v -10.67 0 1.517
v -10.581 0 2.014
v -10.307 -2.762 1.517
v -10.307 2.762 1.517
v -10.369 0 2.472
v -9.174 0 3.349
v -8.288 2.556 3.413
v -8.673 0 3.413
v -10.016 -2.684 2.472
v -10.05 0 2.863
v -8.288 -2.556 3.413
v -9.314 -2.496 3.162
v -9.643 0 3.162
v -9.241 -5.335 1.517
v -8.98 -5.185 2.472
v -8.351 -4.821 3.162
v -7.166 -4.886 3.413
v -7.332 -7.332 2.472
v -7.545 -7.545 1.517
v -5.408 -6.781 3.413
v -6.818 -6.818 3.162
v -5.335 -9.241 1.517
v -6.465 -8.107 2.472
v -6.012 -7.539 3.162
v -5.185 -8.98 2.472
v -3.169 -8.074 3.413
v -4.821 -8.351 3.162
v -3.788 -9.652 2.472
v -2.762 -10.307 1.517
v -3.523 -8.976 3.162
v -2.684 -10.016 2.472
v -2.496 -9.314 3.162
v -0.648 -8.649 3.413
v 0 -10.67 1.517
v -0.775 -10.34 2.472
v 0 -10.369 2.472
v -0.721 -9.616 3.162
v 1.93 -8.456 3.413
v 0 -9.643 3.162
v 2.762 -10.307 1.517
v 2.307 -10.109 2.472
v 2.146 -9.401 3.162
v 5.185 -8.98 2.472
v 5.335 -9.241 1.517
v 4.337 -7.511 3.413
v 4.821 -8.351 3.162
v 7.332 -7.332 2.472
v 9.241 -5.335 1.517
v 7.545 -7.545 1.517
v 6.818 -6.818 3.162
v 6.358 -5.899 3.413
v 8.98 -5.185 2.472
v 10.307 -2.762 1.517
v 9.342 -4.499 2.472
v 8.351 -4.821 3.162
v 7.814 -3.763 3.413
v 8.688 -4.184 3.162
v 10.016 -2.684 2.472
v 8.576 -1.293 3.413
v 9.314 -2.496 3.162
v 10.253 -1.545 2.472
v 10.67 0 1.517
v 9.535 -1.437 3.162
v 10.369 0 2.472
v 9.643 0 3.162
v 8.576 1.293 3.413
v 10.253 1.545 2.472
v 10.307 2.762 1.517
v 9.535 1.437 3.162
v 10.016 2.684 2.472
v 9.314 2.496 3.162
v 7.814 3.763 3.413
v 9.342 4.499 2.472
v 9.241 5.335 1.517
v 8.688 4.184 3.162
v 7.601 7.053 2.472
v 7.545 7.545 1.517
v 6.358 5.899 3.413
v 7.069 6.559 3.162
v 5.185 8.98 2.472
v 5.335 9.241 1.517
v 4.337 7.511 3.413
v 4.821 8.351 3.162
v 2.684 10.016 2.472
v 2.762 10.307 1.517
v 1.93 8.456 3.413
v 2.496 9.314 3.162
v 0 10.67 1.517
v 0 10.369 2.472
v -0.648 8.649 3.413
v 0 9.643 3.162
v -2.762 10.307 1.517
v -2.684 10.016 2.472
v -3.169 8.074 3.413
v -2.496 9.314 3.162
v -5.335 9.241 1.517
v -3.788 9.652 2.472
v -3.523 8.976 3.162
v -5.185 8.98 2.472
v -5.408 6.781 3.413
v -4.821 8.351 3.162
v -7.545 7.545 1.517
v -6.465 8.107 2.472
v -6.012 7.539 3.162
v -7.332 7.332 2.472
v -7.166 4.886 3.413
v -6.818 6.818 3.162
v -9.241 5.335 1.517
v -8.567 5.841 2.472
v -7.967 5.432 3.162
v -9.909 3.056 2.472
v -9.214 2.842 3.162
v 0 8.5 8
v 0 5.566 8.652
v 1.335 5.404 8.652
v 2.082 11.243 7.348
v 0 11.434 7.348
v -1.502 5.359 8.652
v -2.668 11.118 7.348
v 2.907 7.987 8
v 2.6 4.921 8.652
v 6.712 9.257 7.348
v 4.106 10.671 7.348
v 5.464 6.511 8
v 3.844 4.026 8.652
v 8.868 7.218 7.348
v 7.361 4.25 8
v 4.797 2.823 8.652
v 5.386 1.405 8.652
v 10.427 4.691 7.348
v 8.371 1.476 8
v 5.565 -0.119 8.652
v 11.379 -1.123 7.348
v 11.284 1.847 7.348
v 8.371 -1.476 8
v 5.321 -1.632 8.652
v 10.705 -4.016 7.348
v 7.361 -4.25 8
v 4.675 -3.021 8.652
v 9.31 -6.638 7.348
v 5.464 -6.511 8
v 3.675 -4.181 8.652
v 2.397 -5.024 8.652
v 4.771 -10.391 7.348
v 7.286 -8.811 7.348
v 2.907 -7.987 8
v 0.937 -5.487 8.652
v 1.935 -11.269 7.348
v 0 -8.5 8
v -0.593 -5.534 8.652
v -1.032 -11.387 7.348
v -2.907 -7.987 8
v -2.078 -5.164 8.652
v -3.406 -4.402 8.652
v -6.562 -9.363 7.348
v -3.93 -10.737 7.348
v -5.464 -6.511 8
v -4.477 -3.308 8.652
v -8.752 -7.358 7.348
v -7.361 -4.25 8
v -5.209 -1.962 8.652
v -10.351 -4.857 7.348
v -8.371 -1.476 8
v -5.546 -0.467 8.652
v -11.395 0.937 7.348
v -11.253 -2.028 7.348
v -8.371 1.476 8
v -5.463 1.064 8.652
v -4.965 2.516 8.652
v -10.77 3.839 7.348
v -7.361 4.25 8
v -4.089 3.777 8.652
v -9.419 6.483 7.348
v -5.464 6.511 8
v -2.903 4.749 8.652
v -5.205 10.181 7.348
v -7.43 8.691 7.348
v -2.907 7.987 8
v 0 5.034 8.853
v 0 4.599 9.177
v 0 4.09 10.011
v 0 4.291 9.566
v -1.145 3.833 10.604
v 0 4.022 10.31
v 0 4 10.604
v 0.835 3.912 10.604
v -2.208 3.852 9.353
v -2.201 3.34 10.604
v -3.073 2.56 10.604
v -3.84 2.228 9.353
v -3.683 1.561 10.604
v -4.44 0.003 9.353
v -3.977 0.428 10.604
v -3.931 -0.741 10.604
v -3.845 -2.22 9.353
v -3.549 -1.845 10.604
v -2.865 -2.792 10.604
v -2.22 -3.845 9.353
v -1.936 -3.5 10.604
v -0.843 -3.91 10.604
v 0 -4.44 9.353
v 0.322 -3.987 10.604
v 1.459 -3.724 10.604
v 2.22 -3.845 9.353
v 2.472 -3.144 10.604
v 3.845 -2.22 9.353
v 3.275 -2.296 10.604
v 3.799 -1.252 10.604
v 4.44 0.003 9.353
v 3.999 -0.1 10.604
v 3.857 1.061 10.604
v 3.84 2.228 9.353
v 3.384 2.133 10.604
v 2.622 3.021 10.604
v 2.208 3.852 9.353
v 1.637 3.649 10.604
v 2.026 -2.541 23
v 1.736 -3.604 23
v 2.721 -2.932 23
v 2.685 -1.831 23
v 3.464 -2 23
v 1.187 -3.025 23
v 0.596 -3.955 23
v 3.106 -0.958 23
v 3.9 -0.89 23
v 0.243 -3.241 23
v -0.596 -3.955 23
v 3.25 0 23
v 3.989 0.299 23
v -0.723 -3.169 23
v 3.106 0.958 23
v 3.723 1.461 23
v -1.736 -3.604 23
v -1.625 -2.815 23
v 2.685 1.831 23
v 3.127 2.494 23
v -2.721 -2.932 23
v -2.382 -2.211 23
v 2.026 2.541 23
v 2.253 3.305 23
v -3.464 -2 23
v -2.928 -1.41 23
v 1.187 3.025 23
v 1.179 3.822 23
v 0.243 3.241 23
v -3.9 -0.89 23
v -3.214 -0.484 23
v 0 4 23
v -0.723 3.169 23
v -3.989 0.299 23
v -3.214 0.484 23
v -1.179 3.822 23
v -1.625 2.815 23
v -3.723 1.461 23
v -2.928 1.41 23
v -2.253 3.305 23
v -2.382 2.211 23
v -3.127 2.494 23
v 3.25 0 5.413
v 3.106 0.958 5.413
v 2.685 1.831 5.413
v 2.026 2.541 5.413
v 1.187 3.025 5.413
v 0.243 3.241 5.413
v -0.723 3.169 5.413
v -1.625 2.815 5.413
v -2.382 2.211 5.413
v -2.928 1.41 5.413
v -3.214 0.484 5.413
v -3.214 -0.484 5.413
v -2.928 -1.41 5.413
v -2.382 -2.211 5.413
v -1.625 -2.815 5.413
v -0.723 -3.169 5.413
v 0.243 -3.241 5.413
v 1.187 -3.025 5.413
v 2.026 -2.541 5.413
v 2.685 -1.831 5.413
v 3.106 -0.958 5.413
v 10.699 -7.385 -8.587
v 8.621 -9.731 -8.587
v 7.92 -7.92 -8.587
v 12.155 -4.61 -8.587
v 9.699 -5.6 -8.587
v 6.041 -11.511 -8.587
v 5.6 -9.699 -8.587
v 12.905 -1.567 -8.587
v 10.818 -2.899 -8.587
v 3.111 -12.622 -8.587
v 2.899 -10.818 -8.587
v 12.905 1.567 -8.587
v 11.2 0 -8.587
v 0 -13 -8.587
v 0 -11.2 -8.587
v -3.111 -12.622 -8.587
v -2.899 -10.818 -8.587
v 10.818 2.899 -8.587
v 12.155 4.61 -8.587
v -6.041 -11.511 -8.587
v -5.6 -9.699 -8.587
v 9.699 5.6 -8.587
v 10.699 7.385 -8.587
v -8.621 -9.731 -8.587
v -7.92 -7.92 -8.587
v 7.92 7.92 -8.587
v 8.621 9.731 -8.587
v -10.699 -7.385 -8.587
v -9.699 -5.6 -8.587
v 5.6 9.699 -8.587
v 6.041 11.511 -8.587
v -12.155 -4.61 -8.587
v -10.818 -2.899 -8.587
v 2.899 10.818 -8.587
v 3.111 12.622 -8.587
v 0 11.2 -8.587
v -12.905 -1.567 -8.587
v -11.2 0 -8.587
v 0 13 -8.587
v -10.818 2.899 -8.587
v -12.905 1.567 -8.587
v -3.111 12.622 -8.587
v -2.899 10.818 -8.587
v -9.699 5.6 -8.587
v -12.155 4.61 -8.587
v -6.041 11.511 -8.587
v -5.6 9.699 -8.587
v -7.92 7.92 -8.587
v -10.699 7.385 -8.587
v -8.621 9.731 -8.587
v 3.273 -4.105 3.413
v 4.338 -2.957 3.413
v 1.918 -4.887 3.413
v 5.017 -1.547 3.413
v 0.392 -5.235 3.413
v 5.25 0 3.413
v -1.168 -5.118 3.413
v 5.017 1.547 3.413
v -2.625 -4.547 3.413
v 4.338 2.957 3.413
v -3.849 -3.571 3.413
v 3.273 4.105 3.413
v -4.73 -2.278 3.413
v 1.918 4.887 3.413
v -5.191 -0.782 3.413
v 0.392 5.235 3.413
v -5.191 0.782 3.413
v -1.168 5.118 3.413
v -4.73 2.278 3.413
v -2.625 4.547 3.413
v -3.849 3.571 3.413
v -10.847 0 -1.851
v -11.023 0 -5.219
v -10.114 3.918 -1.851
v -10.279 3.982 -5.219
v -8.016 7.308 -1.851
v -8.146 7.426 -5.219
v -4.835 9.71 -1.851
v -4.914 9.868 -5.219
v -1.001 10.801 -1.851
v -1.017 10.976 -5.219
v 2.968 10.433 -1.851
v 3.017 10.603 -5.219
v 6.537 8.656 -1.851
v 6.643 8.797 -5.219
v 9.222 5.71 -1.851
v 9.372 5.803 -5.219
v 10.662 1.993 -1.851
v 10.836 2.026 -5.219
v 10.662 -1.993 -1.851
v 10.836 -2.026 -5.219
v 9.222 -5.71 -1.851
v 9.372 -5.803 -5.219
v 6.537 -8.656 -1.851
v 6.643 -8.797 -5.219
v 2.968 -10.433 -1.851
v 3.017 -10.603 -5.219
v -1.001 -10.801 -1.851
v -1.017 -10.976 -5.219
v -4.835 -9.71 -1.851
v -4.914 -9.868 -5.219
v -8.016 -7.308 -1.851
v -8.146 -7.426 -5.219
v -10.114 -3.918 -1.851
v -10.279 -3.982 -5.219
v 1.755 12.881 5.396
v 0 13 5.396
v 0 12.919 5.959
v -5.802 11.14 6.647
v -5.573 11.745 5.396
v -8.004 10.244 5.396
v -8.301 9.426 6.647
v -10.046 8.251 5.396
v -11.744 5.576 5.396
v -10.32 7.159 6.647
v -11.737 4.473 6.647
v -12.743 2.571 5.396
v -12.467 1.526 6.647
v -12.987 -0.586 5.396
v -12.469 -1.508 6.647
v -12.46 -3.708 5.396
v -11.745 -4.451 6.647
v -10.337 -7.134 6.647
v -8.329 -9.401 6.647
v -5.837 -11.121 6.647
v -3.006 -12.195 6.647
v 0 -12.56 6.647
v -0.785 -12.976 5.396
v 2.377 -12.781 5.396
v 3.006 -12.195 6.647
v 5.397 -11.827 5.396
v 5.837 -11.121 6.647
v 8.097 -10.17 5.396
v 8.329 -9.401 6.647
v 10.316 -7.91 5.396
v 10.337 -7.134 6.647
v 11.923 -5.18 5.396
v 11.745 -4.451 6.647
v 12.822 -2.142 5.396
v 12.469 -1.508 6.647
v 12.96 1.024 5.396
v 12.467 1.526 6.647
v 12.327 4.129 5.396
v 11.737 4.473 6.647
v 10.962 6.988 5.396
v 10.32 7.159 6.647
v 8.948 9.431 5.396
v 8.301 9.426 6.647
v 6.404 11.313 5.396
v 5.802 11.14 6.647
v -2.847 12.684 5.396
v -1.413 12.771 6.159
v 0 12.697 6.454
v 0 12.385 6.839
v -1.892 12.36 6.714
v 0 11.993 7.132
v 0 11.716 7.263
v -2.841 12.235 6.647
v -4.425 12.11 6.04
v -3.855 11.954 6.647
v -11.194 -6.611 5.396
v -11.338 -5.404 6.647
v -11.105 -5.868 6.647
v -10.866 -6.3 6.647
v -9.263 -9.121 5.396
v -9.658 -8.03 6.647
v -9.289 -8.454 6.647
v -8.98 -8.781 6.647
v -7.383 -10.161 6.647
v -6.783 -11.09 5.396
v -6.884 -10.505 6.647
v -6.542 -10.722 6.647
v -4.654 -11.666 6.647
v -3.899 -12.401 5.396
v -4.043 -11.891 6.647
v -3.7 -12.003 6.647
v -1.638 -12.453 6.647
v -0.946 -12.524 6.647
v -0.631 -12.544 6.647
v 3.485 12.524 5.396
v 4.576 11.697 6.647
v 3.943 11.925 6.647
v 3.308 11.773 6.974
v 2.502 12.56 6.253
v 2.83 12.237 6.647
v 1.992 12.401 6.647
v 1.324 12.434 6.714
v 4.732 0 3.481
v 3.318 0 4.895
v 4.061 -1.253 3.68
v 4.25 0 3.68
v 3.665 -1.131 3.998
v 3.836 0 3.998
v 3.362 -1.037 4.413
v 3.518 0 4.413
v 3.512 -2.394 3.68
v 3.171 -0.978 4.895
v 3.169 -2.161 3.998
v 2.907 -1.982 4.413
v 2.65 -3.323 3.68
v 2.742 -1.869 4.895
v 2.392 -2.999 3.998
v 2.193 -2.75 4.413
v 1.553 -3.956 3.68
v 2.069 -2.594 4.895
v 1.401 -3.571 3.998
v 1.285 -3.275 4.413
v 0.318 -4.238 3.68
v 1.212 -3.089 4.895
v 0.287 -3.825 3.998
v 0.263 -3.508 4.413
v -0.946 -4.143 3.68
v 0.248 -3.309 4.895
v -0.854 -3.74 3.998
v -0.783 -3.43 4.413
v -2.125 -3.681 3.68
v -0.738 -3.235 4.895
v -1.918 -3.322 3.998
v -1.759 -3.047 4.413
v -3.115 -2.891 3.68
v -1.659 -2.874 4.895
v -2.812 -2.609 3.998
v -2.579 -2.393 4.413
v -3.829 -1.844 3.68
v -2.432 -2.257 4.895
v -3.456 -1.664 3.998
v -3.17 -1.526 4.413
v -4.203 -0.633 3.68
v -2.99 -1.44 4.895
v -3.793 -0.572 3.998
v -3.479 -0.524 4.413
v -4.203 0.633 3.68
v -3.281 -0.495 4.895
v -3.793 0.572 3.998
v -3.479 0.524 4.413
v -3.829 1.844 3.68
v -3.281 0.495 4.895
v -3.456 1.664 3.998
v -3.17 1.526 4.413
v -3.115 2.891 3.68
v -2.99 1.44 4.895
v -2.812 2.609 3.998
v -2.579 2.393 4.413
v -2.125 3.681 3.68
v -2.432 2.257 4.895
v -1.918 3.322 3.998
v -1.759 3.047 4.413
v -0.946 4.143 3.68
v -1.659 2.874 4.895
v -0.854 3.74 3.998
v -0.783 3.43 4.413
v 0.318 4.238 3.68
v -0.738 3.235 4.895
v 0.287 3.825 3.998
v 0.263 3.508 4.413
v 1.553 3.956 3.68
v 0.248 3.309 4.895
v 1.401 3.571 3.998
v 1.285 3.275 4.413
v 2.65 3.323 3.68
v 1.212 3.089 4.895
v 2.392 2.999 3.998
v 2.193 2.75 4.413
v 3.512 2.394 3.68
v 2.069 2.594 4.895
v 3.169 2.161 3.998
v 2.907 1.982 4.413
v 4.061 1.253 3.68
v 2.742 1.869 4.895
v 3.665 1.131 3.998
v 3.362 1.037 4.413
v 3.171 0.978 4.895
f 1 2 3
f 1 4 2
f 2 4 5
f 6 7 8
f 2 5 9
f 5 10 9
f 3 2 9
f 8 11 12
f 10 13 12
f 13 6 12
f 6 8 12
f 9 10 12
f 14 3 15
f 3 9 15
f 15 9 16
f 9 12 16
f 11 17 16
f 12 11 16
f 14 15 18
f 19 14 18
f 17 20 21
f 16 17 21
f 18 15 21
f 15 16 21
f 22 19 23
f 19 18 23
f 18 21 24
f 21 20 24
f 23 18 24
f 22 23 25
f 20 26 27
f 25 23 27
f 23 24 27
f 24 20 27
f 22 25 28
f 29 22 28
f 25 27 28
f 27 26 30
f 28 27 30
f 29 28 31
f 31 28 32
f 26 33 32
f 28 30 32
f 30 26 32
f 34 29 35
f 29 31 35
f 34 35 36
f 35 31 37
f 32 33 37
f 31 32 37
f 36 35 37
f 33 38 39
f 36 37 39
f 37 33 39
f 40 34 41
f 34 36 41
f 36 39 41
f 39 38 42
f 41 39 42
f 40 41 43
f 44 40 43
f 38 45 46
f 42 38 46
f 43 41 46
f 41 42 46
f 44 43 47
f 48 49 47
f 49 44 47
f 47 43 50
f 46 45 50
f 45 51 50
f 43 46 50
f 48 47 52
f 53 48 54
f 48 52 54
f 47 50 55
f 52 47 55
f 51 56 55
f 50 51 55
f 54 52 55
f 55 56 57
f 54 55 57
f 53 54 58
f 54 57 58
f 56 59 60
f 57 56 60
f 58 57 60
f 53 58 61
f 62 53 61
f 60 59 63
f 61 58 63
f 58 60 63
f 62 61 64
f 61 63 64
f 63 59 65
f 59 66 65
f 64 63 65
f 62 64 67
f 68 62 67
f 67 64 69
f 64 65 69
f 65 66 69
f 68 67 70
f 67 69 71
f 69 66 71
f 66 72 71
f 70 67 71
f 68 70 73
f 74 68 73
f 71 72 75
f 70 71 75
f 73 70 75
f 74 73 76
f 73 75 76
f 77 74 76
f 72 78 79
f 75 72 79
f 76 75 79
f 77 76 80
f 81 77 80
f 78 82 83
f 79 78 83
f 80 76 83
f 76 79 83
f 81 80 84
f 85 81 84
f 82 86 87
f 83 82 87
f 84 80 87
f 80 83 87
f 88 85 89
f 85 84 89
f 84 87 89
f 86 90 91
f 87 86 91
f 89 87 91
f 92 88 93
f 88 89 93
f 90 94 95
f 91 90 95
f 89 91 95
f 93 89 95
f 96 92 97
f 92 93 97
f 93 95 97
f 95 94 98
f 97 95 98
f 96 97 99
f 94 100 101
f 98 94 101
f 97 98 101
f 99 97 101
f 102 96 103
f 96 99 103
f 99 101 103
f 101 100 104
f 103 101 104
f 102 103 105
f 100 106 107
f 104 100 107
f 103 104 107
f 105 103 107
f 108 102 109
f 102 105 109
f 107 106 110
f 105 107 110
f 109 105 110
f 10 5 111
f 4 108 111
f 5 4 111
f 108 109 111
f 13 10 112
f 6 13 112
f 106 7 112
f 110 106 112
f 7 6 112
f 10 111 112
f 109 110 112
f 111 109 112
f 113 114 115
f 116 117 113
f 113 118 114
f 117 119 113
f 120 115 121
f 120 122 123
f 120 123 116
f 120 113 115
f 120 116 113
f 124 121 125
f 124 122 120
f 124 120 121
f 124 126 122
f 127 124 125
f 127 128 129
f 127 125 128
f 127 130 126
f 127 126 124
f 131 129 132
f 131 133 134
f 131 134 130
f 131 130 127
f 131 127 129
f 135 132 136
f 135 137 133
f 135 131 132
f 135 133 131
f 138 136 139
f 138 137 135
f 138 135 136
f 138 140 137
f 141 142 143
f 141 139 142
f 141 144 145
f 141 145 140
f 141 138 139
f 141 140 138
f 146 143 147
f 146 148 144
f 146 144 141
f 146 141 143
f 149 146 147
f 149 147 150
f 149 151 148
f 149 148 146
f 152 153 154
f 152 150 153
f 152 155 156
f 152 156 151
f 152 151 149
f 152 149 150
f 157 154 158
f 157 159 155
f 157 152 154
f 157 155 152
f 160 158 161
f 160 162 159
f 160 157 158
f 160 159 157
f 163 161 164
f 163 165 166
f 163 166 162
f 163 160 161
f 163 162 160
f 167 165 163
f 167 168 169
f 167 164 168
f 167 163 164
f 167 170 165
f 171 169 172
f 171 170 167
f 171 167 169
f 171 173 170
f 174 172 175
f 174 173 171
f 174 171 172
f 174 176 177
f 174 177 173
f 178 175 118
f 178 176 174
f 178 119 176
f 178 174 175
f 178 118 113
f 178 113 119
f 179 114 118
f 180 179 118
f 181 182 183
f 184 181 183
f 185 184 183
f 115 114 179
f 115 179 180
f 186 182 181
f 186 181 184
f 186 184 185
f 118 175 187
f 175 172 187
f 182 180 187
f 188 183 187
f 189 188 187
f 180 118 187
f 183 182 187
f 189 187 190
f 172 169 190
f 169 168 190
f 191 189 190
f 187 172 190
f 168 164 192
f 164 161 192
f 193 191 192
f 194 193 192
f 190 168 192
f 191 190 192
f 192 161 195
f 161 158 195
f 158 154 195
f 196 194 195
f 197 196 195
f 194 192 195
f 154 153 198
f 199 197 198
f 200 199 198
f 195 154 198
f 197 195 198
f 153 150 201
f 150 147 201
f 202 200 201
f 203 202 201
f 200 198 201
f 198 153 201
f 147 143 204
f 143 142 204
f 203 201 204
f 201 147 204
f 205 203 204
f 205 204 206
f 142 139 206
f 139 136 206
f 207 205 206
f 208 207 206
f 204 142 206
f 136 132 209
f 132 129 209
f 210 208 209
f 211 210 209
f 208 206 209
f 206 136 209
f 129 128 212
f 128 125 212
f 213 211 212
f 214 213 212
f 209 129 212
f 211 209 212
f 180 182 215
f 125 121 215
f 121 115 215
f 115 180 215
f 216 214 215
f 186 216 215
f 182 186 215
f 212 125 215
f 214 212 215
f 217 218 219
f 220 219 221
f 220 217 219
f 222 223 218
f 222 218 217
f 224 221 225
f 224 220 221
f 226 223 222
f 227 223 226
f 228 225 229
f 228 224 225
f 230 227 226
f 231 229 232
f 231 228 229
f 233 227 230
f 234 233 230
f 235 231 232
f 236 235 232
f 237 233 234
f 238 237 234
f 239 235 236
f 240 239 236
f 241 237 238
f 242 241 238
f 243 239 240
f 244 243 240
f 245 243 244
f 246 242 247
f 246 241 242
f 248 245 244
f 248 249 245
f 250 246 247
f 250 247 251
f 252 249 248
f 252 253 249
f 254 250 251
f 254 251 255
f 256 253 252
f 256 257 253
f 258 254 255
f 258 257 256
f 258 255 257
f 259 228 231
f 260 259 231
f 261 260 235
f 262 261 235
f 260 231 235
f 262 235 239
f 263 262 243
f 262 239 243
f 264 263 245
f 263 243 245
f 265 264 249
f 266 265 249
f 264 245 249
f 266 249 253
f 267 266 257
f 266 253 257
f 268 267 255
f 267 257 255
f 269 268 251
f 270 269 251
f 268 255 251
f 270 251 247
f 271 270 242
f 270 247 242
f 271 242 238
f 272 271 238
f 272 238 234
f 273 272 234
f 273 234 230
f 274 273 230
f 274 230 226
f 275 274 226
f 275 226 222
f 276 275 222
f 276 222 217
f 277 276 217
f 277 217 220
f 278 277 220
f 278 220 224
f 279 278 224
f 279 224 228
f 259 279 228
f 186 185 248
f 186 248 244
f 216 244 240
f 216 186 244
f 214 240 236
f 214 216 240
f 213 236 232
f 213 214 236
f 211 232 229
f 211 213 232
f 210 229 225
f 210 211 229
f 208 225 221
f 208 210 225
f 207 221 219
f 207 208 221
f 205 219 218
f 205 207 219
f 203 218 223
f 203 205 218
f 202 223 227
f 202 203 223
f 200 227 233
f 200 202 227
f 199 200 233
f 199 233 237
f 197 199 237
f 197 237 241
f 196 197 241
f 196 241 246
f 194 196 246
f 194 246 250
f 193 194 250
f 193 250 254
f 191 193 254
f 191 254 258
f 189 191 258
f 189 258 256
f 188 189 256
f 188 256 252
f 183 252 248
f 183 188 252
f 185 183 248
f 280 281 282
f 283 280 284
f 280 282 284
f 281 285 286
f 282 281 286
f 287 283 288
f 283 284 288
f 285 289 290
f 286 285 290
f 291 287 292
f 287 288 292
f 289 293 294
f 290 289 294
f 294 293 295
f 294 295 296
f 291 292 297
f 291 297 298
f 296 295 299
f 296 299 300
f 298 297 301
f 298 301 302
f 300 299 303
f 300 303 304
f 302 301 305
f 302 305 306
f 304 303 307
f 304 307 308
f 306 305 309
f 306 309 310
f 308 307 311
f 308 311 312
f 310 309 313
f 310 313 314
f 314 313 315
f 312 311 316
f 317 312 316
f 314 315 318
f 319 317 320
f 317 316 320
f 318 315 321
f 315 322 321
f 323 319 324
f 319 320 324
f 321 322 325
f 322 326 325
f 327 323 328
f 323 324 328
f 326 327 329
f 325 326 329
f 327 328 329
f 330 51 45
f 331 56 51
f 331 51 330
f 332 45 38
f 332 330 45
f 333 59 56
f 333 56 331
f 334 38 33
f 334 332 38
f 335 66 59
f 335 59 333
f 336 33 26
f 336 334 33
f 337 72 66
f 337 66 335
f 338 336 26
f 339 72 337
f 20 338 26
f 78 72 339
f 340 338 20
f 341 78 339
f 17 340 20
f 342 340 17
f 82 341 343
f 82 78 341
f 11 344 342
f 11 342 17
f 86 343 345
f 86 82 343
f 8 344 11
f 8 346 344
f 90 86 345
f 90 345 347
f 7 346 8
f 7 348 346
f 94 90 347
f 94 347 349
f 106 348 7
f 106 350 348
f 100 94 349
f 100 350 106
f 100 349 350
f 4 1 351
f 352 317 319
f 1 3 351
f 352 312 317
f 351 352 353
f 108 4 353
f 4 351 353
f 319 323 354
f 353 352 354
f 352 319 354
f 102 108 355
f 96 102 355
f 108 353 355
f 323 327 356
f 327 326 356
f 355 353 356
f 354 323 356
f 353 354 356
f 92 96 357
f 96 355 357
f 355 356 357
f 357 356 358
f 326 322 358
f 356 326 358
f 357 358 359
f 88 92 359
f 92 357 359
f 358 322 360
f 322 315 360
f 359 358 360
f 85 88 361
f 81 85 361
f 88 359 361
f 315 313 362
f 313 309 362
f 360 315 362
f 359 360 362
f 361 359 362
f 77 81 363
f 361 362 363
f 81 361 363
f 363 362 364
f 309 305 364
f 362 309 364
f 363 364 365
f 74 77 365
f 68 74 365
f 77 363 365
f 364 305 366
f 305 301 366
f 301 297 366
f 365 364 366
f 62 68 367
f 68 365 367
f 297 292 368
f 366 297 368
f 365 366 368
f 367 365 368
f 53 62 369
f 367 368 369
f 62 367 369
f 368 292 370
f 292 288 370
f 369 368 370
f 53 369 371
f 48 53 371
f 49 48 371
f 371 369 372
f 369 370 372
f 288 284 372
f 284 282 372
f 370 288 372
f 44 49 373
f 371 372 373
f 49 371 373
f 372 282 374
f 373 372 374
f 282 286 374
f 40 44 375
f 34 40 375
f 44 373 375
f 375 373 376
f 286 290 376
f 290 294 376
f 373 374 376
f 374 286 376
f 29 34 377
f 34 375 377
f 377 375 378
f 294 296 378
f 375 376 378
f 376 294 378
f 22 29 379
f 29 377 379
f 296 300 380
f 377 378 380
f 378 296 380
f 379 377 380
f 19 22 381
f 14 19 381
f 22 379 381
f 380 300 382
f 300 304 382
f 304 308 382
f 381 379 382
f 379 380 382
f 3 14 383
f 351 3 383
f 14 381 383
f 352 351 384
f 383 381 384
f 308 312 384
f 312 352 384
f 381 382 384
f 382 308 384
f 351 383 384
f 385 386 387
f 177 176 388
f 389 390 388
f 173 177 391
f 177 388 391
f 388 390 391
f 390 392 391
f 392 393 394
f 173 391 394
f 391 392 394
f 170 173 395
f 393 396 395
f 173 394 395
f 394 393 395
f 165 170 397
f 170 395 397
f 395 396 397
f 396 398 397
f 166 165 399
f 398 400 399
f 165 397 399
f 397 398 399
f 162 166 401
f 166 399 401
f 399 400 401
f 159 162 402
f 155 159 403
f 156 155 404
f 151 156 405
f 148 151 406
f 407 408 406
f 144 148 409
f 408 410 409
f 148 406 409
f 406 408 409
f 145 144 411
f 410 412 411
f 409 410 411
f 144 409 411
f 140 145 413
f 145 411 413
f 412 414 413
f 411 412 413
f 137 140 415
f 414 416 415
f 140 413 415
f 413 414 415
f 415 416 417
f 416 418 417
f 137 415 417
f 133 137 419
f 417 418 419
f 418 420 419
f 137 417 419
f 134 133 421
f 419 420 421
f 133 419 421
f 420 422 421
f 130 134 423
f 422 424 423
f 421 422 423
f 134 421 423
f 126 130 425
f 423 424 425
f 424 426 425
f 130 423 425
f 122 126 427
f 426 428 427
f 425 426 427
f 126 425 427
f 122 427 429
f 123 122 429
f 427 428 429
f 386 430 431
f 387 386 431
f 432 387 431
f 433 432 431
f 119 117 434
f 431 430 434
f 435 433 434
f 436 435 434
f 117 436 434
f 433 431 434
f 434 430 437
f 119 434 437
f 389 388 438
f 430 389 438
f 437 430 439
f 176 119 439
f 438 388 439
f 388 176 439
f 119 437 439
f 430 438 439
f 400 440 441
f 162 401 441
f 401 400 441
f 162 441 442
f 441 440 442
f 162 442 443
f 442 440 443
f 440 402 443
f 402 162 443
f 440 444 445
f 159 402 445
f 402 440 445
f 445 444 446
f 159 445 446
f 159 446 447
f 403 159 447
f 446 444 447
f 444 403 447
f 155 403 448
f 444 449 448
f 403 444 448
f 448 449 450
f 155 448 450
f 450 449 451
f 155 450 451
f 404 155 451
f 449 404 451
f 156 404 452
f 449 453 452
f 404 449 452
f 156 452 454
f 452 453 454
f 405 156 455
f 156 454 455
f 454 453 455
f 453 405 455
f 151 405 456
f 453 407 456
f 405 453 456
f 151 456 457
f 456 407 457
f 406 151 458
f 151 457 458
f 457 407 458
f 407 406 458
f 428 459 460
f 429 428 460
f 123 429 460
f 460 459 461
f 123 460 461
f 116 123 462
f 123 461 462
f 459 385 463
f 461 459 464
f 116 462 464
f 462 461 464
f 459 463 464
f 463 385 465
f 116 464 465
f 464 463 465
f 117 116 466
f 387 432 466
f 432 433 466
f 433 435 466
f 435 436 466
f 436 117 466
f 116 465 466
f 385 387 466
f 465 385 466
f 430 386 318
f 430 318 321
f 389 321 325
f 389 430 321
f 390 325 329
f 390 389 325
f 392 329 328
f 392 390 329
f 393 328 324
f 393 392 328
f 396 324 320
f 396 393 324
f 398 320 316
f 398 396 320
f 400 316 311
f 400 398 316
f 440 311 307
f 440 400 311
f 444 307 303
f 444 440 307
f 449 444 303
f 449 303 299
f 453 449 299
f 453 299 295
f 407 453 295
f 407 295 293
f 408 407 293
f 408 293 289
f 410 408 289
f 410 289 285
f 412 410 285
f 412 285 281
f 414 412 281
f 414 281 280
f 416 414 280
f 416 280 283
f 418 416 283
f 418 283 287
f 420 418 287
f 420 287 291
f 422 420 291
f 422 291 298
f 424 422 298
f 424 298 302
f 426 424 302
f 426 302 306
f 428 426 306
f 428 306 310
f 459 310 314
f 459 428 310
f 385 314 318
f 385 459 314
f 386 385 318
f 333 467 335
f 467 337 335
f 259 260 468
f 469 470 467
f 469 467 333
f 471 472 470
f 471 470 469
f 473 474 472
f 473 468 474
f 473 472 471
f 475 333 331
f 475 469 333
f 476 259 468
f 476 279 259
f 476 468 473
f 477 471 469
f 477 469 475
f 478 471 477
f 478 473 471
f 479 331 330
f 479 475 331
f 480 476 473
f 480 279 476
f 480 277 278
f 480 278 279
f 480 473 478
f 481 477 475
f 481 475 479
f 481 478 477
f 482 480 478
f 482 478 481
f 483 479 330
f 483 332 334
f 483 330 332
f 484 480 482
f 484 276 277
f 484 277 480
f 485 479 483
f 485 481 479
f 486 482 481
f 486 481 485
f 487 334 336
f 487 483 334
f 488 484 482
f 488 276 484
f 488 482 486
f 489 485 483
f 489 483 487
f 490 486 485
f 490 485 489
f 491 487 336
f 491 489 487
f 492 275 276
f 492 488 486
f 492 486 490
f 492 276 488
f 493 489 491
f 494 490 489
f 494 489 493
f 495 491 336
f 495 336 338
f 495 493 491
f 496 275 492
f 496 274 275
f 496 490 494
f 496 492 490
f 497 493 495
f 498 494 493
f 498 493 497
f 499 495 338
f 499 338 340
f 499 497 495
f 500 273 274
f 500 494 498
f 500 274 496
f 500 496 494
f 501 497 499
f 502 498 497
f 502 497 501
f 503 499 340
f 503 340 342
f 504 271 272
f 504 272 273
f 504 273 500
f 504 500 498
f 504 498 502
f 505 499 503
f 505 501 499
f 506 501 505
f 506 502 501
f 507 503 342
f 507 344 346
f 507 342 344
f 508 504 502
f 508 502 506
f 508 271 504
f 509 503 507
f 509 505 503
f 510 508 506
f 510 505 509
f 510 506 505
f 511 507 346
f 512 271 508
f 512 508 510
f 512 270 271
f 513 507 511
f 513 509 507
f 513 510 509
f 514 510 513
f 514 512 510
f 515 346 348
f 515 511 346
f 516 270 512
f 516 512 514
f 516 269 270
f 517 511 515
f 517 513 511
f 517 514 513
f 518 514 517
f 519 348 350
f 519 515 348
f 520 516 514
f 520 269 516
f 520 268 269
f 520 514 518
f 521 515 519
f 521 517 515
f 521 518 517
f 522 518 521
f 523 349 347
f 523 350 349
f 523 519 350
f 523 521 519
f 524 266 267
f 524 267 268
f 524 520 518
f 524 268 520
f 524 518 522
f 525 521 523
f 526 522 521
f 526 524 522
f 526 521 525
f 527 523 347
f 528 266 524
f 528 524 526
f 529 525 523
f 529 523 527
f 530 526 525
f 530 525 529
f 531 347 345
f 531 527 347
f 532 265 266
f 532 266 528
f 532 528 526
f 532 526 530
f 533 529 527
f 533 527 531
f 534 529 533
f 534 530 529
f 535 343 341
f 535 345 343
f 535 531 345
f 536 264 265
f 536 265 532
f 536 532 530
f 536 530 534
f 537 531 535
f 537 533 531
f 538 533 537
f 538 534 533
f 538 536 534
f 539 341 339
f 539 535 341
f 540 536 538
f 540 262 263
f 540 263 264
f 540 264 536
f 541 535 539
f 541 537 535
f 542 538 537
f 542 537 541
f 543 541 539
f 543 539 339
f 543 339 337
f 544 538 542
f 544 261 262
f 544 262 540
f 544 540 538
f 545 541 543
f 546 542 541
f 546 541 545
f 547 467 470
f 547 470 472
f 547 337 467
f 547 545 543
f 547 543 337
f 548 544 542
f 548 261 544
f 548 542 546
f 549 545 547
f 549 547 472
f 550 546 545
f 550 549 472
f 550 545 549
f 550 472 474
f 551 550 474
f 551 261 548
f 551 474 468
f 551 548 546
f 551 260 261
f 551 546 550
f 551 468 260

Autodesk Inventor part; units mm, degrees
ref_plane "YZ Plane" through (0, 0, 0) normal (1, 0, 0) x (0, 1, 0)
ref_plane "XZ Plane" through (0, 0, 0) normal (0, 1, 0) x (-1, 0, 0)
ref_plane "XY Plane" through (0, 0, 0) normal (0, 0, 1) x (1, 0, 0)
sketch "Sketch1" plane through (0, 0, 0) normal (1, 0, 0) x (0, 1, 0)
  line L0 (-11, 0) -> (11, 0)
  line L1 (13, -8.587477) -> (0, -8.587477)
  line L2 (0, -8.587477) -> (0, 9)
  line L3 (0, 9) -> (4, 9)
  line L4 (4, 9) -> (11, 0) construction
  line L5 (4, 9) -> (13, 7)
  line L6 (13, 7) -> (13, 2)
  line L7 (13, 2) -> (13, 0)
  line L8 (4, 9) -> (0, 9)
  line L9 (0, 9) -> (0, 23)
  line L10 (0, 23) -> (4, 23)
  line L11 (4, 23) -> (4, 9)
  line L12 (13, -8.587477) -> (13, 0)
  point P0 (0, 0)
  dimension "d12" = 4
  dimension "d13" = 0
  dimension "d15" = 13
  dimension "d16" = 0
  dimension "d17" = 2
  dimension "d19" = 5
  dimension "d20" = 14
revolve "Revolution1" add sketch "Sketch1" angle 360 about axis through (0, 0, -8.587477) along (0, 0, 1)
sketch "Sketch4" plane through (0, 0, 23) normal (0, 0, 1) x (1, 0, 0)
  circle A0 centre (0, 0) radius 1.479649
  circle A1 centre (0, 0) radius 4
  circle A2 centre (0, 0) radius 3.25
  point P0 (0, 0)
  dimension "d21" = 6.5
extrude "Extrusion2" cut sketch "Sketch4" against normal through all contours A0 | A2
sketch "Sketch5" plane through (0, 0, -8.587477) normal (0, 0, -1) x (-1, 0, 0)
  circle A0 centre (0, 0) radius 11.938351
  circle A1 centre (0, 0) radius 11.2
  circle A2 centre (0, 0) radius 11
  point P0 (0, 0)
  dimension "d28" = 0.2
sketch "Sketch5 outline for Extrusion3" plane through (0, 0, -8.587477) normal (0, 0, -1) x (-1, 0, 0)
  circle A0 centre (0, 0) radius 11.2
extrude "Extrusion3" cut sketch "Sketch5 outline for Extrusion3" against normal blind 12 draft -3
fillet "Fillet2" radius 2 4 edges at (0, -4, 9) (0, -13, 7) (10.5711, 0, 3.4125) (-3.25, 0, 3.4125)
properties part number "01_Connector_T"
